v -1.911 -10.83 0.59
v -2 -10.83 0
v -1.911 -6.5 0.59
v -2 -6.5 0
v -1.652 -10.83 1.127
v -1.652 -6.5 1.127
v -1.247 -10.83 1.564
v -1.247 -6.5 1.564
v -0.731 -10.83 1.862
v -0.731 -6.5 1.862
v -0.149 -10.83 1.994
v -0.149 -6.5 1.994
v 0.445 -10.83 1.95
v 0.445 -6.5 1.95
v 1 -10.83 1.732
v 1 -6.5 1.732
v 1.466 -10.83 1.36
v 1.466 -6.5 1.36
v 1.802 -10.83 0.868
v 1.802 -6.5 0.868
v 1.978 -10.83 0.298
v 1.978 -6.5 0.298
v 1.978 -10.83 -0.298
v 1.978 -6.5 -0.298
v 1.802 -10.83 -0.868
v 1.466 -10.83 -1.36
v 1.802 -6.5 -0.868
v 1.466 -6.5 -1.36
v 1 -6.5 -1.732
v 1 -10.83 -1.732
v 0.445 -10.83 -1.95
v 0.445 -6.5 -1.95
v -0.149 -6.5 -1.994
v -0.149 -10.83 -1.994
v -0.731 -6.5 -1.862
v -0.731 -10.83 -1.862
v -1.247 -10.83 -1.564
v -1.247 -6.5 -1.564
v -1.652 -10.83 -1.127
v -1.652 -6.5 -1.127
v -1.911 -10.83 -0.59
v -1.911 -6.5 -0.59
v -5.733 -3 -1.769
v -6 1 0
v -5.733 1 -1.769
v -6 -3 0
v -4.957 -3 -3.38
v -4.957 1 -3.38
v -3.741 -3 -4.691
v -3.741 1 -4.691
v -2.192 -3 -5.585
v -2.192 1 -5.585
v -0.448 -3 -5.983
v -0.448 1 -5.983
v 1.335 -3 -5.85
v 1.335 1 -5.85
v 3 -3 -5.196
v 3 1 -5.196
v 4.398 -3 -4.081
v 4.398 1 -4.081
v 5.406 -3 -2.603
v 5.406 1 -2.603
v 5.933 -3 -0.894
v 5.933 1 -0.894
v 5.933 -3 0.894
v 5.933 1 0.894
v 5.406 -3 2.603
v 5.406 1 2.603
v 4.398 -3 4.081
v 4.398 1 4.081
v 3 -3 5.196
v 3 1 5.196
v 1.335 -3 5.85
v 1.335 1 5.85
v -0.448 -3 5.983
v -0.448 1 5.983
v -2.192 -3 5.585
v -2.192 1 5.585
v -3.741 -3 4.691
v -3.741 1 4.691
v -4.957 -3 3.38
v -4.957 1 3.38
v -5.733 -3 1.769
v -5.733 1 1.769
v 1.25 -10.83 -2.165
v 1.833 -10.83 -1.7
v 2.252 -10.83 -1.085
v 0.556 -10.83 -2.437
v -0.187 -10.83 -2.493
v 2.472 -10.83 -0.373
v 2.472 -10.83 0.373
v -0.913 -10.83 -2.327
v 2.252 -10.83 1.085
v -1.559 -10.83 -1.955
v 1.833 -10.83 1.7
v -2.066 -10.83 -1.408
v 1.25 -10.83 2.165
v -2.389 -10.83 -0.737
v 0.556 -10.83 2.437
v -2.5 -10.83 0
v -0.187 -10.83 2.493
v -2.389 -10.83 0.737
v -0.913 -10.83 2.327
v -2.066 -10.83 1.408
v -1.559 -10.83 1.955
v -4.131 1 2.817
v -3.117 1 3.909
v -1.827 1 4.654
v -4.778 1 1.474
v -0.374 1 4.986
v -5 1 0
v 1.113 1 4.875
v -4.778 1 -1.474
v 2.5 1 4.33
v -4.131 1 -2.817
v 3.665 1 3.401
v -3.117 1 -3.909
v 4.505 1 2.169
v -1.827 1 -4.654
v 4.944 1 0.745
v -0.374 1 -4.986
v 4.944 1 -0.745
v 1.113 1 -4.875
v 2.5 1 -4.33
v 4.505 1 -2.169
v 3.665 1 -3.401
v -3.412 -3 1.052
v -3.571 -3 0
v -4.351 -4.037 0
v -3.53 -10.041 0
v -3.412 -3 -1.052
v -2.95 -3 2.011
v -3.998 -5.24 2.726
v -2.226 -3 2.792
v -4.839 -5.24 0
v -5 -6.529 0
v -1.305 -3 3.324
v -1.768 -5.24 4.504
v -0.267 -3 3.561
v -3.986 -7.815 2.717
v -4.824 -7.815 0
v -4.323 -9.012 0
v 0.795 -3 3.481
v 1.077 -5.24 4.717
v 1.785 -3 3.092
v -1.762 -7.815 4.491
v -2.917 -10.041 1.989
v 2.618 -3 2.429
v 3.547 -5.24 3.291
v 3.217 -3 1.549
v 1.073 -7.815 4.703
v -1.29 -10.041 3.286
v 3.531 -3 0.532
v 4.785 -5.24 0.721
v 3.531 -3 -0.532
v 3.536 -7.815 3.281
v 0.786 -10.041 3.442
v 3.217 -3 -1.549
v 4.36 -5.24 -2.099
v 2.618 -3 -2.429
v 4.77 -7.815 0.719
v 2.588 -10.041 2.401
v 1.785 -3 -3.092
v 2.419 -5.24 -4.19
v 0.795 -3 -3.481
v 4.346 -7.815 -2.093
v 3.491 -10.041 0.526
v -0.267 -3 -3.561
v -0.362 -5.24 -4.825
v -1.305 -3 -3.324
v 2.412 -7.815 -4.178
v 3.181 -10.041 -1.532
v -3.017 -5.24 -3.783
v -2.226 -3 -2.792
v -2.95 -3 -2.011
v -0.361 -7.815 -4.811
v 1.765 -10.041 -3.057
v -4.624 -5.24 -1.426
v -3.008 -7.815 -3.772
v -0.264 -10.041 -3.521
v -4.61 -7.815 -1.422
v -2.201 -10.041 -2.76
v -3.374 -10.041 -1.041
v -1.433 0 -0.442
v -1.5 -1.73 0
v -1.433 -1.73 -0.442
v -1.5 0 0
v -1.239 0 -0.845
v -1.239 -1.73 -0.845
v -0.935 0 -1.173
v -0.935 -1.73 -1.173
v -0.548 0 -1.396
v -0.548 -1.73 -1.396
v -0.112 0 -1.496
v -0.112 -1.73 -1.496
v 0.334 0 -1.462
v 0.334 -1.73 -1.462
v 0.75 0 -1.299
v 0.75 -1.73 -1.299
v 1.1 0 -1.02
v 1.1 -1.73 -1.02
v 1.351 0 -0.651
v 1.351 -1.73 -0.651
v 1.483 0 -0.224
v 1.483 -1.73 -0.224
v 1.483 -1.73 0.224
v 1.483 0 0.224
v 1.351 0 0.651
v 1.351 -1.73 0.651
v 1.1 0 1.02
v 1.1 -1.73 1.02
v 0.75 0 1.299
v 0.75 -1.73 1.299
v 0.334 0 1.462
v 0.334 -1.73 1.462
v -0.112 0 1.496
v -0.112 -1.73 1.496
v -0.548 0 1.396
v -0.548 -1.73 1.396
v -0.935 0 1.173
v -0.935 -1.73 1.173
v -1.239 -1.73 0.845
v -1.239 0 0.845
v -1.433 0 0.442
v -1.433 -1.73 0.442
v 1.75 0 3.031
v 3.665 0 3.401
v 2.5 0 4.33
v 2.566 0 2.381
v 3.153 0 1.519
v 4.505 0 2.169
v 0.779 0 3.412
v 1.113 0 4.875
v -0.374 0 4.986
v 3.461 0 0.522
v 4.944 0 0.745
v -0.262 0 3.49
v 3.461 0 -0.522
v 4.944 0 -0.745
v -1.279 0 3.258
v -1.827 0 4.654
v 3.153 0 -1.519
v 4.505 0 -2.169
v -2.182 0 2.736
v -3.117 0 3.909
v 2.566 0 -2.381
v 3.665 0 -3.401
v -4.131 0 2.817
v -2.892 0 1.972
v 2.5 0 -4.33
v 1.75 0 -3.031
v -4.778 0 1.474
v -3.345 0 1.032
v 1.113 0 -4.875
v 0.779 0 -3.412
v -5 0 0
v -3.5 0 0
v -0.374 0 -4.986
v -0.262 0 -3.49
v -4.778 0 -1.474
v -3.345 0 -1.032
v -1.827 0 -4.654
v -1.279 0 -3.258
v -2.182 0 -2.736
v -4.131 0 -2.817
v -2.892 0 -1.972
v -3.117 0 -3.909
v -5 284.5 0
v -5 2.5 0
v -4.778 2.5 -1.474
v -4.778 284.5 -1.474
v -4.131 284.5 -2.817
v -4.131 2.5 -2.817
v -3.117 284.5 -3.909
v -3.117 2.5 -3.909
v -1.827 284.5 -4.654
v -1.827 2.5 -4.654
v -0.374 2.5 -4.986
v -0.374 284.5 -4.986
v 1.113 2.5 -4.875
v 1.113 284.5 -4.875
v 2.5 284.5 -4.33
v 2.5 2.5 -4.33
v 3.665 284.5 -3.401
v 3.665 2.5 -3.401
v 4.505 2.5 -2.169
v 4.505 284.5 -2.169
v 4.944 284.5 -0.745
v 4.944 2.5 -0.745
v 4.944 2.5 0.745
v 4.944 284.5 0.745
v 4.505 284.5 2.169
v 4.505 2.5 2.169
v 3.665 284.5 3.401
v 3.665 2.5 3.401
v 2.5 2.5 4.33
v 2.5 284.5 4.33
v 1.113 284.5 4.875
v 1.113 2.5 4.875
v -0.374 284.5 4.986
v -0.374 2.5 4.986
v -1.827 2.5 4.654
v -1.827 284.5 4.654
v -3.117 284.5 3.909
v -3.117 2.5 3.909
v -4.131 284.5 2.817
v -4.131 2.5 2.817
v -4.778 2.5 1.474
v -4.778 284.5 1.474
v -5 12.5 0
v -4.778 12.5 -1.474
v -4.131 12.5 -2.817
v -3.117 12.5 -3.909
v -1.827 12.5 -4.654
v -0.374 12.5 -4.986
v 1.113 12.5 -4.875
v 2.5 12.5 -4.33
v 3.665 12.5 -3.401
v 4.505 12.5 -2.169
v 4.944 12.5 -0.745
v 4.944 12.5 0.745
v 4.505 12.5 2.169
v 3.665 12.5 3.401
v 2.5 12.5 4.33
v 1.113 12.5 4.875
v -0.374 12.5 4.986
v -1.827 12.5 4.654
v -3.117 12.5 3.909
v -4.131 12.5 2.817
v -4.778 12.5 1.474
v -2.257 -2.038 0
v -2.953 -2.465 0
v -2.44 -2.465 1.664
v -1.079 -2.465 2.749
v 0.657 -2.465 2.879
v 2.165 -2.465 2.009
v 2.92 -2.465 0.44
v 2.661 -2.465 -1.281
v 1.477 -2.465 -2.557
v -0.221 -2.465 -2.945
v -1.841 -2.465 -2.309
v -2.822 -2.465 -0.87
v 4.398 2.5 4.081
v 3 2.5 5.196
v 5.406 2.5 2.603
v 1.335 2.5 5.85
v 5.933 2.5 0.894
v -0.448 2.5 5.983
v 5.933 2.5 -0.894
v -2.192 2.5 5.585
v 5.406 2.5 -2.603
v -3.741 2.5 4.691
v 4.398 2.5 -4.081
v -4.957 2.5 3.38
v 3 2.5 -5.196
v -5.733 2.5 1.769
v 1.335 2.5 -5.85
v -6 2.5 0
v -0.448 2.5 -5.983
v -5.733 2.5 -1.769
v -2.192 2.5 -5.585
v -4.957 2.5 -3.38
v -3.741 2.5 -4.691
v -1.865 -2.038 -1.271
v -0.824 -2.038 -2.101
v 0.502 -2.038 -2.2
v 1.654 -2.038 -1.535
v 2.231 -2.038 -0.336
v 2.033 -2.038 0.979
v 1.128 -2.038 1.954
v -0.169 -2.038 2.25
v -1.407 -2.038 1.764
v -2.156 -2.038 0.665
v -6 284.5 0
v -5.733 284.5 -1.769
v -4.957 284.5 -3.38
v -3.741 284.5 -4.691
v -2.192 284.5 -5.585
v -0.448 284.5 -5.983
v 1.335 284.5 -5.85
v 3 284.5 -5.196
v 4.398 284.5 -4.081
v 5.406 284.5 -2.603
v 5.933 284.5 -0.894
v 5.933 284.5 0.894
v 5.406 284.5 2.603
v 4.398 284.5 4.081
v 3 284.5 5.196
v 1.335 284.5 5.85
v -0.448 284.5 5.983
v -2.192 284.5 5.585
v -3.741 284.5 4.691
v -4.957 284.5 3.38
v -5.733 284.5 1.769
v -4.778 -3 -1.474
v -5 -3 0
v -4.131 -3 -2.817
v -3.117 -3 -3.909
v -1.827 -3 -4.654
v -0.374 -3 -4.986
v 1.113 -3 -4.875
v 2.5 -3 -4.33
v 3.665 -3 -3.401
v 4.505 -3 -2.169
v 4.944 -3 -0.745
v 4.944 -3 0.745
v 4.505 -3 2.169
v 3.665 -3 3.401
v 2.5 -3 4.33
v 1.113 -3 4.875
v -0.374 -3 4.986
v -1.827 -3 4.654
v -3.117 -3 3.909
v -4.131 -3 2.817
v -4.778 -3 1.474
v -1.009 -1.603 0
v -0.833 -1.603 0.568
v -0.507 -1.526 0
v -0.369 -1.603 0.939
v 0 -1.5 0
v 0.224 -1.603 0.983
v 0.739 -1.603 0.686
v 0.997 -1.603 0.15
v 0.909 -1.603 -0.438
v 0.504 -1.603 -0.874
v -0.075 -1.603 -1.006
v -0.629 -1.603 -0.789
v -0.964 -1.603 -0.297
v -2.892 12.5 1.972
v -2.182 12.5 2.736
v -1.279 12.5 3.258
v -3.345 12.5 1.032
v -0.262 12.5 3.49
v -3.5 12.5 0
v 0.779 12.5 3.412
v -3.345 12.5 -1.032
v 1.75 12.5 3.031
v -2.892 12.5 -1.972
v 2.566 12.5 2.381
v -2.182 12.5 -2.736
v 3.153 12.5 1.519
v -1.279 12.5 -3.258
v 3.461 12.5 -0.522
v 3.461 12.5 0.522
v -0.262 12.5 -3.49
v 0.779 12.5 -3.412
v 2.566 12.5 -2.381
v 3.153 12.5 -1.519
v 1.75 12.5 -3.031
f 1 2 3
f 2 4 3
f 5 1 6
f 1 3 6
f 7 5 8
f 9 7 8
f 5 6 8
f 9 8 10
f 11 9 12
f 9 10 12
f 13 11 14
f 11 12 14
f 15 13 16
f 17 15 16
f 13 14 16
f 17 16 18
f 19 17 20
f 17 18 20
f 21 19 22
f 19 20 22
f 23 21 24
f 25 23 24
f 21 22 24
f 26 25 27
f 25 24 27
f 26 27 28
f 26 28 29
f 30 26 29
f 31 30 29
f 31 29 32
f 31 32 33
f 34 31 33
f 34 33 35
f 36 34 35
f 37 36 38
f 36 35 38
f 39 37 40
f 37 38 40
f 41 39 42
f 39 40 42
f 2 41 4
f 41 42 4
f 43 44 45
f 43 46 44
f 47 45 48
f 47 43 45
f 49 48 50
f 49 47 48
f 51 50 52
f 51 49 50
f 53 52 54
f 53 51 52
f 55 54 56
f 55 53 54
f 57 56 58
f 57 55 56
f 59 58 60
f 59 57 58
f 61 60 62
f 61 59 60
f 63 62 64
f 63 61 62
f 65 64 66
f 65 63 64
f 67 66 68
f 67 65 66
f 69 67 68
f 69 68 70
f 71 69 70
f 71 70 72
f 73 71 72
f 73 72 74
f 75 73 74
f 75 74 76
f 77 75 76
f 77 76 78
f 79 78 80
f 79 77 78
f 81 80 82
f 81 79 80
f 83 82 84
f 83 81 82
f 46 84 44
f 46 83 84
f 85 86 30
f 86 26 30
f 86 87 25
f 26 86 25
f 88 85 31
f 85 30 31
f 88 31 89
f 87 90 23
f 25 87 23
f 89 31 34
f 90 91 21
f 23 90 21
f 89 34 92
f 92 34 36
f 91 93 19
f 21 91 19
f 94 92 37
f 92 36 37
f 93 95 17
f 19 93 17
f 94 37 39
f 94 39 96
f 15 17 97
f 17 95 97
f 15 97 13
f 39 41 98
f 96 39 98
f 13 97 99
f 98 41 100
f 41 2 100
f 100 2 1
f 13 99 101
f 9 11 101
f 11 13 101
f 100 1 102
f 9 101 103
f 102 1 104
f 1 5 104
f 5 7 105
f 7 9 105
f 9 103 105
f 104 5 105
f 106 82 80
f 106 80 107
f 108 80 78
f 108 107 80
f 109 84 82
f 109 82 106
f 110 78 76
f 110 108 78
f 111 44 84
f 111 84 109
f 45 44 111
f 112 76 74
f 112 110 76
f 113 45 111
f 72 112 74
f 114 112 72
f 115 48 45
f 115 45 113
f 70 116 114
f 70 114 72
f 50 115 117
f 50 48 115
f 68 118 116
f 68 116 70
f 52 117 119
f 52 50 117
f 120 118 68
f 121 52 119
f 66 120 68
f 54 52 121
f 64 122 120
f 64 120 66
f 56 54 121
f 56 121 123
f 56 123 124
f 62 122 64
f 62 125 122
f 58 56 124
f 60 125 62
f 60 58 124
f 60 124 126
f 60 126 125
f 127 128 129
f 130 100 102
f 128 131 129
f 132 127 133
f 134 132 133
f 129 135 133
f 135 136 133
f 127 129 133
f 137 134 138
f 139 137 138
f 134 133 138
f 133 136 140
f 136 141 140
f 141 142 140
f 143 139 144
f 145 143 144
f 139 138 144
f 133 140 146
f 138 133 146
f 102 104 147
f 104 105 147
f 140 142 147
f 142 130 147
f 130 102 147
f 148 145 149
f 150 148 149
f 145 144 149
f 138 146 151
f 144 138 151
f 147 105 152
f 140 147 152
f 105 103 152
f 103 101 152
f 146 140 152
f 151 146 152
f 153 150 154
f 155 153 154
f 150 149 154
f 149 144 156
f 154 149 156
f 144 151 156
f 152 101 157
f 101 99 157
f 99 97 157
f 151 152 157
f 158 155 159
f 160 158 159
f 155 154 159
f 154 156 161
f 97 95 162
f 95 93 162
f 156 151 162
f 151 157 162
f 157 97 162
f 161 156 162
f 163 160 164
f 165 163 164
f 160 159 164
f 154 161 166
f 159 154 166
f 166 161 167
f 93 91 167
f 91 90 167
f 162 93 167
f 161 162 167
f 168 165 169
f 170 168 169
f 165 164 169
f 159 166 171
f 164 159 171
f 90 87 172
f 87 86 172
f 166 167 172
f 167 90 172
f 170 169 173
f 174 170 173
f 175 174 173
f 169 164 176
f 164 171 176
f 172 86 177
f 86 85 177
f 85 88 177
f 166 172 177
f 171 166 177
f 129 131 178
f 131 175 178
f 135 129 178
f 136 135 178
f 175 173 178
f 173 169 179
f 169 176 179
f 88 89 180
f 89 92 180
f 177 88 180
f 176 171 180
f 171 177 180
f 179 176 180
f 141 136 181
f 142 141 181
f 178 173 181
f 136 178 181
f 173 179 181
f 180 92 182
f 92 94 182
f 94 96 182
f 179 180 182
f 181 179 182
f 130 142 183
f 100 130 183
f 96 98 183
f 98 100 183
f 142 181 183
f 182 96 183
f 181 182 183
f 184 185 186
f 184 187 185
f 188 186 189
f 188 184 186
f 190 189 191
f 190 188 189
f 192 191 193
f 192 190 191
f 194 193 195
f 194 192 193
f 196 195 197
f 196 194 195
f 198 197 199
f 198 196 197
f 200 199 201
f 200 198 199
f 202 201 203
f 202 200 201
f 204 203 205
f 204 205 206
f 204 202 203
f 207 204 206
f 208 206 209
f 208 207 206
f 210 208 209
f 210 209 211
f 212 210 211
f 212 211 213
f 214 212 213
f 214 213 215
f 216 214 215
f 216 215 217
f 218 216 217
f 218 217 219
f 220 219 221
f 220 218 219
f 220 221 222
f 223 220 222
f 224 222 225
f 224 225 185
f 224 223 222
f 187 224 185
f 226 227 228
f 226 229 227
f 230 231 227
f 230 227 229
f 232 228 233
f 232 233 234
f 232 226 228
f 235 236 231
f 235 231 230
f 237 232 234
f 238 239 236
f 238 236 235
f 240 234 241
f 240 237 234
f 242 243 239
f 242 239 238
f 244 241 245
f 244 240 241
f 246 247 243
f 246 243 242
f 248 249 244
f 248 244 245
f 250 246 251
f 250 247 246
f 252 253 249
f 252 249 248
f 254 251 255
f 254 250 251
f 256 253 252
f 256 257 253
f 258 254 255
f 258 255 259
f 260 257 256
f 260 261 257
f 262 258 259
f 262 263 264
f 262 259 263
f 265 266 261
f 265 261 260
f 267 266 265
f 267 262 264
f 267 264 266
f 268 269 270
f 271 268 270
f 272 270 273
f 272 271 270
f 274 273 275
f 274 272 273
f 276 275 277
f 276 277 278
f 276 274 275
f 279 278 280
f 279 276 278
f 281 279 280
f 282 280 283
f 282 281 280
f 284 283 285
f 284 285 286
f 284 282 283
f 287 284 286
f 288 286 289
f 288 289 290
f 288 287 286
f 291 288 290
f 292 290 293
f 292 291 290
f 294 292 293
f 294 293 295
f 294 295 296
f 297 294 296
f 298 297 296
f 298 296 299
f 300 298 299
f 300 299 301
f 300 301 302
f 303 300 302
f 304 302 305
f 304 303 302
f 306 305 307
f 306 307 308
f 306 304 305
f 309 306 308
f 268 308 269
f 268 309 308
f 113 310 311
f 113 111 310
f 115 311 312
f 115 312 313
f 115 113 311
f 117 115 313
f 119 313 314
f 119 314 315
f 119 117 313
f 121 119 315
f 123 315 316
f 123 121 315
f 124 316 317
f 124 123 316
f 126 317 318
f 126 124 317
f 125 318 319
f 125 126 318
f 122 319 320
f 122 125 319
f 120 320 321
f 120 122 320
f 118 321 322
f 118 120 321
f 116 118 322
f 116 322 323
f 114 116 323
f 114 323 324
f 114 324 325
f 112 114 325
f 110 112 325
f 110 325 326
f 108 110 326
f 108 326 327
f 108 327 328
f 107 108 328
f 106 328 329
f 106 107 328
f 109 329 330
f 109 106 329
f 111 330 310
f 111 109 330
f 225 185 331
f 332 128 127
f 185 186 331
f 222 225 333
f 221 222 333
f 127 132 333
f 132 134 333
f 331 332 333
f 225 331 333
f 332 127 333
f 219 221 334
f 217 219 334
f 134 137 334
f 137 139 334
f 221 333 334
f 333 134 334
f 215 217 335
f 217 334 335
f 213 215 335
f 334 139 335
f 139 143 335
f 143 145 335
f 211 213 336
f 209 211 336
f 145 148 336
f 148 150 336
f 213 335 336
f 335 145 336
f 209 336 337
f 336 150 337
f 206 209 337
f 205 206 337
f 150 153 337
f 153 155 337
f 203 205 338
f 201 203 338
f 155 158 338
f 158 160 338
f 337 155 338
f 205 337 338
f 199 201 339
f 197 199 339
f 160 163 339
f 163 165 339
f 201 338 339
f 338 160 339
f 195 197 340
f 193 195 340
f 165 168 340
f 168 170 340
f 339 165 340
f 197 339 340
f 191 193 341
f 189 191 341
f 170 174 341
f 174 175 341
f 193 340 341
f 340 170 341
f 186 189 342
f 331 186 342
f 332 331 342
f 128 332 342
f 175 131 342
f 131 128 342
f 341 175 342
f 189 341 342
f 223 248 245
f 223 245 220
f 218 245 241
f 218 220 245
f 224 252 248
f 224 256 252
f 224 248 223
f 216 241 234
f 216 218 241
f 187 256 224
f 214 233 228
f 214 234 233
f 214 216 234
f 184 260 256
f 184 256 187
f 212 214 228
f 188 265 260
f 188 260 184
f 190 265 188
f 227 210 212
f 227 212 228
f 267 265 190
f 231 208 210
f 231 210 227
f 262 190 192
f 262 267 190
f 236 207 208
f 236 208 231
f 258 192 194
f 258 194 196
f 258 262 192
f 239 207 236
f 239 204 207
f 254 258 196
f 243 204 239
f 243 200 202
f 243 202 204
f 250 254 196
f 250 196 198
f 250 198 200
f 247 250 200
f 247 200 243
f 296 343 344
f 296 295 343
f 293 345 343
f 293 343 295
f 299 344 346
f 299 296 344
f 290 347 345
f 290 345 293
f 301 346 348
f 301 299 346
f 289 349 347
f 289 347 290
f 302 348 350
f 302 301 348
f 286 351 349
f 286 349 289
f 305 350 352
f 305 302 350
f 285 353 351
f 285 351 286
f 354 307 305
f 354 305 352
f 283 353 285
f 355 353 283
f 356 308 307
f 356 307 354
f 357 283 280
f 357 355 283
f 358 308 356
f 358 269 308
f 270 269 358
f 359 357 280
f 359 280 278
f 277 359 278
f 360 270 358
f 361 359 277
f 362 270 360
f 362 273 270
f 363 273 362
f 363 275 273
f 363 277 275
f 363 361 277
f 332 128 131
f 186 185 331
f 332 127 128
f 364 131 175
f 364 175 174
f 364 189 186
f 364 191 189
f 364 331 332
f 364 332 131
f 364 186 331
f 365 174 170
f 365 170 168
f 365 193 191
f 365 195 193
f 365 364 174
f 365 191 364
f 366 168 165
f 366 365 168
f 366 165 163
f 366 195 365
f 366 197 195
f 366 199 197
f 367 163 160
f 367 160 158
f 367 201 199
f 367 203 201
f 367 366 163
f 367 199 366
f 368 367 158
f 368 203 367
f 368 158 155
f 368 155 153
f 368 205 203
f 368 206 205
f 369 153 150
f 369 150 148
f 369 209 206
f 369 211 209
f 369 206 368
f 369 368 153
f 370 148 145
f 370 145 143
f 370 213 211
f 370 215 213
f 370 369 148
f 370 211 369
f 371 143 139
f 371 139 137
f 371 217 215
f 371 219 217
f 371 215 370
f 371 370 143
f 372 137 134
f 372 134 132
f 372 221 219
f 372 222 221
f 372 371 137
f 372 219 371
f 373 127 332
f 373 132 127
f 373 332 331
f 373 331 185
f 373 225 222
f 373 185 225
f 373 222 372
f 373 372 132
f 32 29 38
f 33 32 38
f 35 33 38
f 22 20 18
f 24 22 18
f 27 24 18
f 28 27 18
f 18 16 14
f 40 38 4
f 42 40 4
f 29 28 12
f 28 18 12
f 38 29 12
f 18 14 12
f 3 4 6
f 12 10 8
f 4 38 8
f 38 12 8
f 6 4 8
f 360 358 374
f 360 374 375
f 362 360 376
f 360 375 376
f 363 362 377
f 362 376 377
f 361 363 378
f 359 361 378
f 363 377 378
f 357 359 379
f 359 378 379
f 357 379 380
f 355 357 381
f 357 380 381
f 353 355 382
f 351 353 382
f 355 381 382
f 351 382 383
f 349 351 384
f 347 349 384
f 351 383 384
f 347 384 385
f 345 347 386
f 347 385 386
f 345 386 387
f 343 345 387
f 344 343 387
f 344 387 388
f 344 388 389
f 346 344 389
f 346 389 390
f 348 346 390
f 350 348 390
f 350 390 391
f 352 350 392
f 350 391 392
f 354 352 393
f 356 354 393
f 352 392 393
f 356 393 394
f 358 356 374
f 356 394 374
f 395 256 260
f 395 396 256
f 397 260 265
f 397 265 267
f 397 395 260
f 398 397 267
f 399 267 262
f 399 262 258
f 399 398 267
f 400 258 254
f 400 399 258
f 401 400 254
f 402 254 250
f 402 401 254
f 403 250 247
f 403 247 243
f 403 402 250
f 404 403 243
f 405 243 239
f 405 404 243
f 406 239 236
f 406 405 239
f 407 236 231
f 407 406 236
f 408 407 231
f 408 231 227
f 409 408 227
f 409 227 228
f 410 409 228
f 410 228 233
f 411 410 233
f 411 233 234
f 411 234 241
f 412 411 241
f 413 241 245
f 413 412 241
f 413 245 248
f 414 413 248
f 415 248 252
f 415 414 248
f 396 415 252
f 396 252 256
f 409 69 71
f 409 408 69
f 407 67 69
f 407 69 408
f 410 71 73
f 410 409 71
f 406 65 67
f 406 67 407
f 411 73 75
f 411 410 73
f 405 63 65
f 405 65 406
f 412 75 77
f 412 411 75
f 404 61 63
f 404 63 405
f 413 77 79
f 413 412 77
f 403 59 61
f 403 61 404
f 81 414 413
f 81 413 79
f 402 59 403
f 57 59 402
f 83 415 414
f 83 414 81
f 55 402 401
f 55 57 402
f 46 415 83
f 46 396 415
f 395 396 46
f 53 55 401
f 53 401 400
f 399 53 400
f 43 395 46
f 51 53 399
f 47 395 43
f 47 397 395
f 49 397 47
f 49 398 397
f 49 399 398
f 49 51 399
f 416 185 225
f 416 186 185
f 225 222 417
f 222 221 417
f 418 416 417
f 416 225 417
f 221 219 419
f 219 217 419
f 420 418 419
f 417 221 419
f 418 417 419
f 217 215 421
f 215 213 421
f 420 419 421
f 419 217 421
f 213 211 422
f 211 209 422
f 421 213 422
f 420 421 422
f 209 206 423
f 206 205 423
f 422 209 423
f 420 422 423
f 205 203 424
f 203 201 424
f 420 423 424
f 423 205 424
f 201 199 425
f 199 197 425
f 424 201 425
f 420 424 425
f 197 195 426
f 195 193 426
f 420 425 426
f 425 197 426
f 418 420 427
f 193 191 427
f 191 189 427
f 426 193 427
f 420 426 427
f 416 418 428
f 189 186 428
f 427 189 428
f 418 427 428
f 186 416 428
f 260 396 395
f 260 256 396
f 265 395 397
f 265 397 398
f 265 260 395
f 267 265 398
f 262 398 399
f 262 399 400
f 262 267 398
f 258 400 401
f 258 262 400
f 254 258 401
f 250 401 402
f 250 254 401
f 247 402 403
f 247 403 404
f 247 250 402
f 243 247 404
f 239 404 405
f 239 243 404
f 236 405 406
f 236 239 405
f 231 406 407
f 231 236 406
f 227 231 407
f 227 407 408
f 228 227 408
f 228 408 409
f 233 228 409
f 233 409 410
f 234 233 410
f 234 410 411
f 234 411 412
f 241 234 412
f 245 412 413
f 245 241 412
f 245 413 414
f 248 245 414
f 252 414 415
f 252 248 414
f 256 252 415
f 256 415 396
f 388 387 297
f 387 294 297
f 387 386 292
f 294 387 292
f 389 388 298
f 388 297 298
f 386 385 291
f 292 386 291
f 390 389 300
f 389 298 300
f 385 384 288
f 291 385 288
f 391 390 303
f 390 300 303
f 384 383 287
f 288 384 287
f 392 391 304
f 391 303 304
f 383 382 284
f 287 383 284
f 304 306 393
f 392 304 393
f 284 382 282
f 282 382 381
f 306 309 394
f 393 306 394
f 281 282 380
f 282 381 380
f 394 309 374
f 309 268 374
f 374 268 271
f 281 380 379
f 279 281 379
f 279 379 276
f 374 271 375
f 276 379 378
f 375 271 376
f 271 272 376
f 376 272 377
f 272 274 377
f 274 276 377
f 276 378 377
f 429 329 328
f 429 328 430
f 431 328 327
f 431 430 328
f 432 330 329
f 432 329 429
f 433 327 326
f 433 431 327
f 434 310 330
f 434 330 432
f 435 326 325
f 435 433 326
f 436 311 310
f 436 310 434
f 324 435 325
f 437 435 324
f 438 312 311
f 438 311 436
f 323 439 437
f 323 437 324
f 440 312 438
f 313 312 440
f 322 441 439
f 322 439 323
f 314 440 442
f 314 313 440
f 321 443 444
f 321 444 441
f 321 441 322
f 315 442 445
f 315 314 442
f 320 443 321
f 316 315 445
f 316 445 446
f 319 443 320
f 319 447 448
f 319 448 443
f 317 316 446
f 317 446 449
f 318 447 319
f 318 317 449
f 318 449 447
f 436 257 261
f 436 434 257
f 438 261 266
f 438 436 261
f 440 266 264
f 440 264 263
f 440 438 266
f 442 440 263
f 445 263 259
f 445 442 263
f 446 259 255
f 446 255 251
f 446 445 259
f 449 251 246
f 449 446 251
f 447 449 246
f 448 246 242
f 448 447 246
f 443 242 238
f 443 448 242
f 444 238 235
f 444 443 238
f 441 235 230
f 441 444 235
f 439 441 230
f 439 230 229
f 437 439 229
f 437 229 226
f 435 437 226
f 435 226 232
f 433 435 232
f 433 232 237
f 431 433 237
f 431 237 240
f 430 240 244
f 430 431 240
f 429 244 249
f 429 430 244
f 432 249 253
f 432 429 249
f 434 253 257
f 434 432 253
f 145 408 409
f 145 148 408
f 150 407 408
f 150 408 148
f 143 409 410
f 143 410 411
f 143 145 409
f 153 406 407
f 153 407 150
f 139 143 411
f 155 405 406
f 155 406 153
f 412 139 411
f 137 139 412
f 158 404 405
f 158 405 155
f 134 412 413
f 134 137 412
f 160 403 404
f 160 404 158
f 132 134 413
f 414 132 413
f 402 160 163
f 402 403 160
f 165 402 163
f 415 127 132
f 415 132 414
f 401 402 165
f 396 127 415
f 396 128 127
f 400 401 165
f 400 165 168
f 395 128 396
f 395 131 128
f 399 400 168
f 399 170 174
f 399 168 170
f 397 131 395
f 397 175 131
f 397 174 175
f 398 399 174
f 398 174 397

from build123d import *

# Parameters (mm, degrees)
F2_W = 1
F2_H = 282


with BuildPart() as f1:
    # F0 (on Top) → F1 (revolve)
    with BuildSketch(Plane.XY):
        with BuildLine():
            ThreePointArc((-3.570714, -3), (-2.613631, -2.237497), (-1.5, -1.730304))
            Line((-1.5, -1.730304), (-1.5, 0))
            Line((-1.5, 0), (-5, 0))
            Line((-5, 0), (-5, -3))
            Line((-5, -3), (-3.570714, -3))
        make_face()
    revolve(axis=Axis((0, -3.25, 0), (0, -1, 0)))


with BuildPart() as f3:
    # F2 (on Top) → F3 (revolve)
    with BuildSketch(Plane.XY):
        with Locations((-5.5, 143.5)):
            Rectangle(F2_W, F2_H)
    revolve(axis=Axis((0, -3.25, 0), (0, -1, 0)))


with BuildPart() as f5:
    # F4 (on Top) → F5 (revolve)
    with BuildSketch(Plane.XY):
        Polygon((-5, 1), (-6, 1), (-6, -3), (-5, -3), (-5, 0), (-3.5, 0), (-3.5, 12.5), (-5, 12.5), (-5, 2.5), align=None)
    revolve(axis=Axis((0, -3.25, 0), (0, -1, 0)))


with BuildPart() as f6:
    # F0 (on Top) → F6 (revolve)
    with BuildSketch(Plane.XY):
        with BuildLine():
            Line((0, -6.5), (0, -1.5))
            ThreePointArc((0, -1.5), (-0.758788, -1.557911), (-1.5, -1.730304))
            ThreePointArc((-1.5, -1.730304), (-2.613631, -2.237497), (-3.570714, -3))
            ThreePointArc((-3.570714, -3), (-4.953899, -7.17741), (-2.5, -10.830127))
            Line((-2.5, -10.830127), (-2, -10.830127))
            Line((-2, -10.830127), (-2, -6.5))
            Line((-2, -6.5), (0, -6.5))
        make_face()
    revolve(axis=Axis((0, -9, 0), (0, 1, 0)))


solid = Compound([f1.part, f3.part, f5.part, f6.part])
